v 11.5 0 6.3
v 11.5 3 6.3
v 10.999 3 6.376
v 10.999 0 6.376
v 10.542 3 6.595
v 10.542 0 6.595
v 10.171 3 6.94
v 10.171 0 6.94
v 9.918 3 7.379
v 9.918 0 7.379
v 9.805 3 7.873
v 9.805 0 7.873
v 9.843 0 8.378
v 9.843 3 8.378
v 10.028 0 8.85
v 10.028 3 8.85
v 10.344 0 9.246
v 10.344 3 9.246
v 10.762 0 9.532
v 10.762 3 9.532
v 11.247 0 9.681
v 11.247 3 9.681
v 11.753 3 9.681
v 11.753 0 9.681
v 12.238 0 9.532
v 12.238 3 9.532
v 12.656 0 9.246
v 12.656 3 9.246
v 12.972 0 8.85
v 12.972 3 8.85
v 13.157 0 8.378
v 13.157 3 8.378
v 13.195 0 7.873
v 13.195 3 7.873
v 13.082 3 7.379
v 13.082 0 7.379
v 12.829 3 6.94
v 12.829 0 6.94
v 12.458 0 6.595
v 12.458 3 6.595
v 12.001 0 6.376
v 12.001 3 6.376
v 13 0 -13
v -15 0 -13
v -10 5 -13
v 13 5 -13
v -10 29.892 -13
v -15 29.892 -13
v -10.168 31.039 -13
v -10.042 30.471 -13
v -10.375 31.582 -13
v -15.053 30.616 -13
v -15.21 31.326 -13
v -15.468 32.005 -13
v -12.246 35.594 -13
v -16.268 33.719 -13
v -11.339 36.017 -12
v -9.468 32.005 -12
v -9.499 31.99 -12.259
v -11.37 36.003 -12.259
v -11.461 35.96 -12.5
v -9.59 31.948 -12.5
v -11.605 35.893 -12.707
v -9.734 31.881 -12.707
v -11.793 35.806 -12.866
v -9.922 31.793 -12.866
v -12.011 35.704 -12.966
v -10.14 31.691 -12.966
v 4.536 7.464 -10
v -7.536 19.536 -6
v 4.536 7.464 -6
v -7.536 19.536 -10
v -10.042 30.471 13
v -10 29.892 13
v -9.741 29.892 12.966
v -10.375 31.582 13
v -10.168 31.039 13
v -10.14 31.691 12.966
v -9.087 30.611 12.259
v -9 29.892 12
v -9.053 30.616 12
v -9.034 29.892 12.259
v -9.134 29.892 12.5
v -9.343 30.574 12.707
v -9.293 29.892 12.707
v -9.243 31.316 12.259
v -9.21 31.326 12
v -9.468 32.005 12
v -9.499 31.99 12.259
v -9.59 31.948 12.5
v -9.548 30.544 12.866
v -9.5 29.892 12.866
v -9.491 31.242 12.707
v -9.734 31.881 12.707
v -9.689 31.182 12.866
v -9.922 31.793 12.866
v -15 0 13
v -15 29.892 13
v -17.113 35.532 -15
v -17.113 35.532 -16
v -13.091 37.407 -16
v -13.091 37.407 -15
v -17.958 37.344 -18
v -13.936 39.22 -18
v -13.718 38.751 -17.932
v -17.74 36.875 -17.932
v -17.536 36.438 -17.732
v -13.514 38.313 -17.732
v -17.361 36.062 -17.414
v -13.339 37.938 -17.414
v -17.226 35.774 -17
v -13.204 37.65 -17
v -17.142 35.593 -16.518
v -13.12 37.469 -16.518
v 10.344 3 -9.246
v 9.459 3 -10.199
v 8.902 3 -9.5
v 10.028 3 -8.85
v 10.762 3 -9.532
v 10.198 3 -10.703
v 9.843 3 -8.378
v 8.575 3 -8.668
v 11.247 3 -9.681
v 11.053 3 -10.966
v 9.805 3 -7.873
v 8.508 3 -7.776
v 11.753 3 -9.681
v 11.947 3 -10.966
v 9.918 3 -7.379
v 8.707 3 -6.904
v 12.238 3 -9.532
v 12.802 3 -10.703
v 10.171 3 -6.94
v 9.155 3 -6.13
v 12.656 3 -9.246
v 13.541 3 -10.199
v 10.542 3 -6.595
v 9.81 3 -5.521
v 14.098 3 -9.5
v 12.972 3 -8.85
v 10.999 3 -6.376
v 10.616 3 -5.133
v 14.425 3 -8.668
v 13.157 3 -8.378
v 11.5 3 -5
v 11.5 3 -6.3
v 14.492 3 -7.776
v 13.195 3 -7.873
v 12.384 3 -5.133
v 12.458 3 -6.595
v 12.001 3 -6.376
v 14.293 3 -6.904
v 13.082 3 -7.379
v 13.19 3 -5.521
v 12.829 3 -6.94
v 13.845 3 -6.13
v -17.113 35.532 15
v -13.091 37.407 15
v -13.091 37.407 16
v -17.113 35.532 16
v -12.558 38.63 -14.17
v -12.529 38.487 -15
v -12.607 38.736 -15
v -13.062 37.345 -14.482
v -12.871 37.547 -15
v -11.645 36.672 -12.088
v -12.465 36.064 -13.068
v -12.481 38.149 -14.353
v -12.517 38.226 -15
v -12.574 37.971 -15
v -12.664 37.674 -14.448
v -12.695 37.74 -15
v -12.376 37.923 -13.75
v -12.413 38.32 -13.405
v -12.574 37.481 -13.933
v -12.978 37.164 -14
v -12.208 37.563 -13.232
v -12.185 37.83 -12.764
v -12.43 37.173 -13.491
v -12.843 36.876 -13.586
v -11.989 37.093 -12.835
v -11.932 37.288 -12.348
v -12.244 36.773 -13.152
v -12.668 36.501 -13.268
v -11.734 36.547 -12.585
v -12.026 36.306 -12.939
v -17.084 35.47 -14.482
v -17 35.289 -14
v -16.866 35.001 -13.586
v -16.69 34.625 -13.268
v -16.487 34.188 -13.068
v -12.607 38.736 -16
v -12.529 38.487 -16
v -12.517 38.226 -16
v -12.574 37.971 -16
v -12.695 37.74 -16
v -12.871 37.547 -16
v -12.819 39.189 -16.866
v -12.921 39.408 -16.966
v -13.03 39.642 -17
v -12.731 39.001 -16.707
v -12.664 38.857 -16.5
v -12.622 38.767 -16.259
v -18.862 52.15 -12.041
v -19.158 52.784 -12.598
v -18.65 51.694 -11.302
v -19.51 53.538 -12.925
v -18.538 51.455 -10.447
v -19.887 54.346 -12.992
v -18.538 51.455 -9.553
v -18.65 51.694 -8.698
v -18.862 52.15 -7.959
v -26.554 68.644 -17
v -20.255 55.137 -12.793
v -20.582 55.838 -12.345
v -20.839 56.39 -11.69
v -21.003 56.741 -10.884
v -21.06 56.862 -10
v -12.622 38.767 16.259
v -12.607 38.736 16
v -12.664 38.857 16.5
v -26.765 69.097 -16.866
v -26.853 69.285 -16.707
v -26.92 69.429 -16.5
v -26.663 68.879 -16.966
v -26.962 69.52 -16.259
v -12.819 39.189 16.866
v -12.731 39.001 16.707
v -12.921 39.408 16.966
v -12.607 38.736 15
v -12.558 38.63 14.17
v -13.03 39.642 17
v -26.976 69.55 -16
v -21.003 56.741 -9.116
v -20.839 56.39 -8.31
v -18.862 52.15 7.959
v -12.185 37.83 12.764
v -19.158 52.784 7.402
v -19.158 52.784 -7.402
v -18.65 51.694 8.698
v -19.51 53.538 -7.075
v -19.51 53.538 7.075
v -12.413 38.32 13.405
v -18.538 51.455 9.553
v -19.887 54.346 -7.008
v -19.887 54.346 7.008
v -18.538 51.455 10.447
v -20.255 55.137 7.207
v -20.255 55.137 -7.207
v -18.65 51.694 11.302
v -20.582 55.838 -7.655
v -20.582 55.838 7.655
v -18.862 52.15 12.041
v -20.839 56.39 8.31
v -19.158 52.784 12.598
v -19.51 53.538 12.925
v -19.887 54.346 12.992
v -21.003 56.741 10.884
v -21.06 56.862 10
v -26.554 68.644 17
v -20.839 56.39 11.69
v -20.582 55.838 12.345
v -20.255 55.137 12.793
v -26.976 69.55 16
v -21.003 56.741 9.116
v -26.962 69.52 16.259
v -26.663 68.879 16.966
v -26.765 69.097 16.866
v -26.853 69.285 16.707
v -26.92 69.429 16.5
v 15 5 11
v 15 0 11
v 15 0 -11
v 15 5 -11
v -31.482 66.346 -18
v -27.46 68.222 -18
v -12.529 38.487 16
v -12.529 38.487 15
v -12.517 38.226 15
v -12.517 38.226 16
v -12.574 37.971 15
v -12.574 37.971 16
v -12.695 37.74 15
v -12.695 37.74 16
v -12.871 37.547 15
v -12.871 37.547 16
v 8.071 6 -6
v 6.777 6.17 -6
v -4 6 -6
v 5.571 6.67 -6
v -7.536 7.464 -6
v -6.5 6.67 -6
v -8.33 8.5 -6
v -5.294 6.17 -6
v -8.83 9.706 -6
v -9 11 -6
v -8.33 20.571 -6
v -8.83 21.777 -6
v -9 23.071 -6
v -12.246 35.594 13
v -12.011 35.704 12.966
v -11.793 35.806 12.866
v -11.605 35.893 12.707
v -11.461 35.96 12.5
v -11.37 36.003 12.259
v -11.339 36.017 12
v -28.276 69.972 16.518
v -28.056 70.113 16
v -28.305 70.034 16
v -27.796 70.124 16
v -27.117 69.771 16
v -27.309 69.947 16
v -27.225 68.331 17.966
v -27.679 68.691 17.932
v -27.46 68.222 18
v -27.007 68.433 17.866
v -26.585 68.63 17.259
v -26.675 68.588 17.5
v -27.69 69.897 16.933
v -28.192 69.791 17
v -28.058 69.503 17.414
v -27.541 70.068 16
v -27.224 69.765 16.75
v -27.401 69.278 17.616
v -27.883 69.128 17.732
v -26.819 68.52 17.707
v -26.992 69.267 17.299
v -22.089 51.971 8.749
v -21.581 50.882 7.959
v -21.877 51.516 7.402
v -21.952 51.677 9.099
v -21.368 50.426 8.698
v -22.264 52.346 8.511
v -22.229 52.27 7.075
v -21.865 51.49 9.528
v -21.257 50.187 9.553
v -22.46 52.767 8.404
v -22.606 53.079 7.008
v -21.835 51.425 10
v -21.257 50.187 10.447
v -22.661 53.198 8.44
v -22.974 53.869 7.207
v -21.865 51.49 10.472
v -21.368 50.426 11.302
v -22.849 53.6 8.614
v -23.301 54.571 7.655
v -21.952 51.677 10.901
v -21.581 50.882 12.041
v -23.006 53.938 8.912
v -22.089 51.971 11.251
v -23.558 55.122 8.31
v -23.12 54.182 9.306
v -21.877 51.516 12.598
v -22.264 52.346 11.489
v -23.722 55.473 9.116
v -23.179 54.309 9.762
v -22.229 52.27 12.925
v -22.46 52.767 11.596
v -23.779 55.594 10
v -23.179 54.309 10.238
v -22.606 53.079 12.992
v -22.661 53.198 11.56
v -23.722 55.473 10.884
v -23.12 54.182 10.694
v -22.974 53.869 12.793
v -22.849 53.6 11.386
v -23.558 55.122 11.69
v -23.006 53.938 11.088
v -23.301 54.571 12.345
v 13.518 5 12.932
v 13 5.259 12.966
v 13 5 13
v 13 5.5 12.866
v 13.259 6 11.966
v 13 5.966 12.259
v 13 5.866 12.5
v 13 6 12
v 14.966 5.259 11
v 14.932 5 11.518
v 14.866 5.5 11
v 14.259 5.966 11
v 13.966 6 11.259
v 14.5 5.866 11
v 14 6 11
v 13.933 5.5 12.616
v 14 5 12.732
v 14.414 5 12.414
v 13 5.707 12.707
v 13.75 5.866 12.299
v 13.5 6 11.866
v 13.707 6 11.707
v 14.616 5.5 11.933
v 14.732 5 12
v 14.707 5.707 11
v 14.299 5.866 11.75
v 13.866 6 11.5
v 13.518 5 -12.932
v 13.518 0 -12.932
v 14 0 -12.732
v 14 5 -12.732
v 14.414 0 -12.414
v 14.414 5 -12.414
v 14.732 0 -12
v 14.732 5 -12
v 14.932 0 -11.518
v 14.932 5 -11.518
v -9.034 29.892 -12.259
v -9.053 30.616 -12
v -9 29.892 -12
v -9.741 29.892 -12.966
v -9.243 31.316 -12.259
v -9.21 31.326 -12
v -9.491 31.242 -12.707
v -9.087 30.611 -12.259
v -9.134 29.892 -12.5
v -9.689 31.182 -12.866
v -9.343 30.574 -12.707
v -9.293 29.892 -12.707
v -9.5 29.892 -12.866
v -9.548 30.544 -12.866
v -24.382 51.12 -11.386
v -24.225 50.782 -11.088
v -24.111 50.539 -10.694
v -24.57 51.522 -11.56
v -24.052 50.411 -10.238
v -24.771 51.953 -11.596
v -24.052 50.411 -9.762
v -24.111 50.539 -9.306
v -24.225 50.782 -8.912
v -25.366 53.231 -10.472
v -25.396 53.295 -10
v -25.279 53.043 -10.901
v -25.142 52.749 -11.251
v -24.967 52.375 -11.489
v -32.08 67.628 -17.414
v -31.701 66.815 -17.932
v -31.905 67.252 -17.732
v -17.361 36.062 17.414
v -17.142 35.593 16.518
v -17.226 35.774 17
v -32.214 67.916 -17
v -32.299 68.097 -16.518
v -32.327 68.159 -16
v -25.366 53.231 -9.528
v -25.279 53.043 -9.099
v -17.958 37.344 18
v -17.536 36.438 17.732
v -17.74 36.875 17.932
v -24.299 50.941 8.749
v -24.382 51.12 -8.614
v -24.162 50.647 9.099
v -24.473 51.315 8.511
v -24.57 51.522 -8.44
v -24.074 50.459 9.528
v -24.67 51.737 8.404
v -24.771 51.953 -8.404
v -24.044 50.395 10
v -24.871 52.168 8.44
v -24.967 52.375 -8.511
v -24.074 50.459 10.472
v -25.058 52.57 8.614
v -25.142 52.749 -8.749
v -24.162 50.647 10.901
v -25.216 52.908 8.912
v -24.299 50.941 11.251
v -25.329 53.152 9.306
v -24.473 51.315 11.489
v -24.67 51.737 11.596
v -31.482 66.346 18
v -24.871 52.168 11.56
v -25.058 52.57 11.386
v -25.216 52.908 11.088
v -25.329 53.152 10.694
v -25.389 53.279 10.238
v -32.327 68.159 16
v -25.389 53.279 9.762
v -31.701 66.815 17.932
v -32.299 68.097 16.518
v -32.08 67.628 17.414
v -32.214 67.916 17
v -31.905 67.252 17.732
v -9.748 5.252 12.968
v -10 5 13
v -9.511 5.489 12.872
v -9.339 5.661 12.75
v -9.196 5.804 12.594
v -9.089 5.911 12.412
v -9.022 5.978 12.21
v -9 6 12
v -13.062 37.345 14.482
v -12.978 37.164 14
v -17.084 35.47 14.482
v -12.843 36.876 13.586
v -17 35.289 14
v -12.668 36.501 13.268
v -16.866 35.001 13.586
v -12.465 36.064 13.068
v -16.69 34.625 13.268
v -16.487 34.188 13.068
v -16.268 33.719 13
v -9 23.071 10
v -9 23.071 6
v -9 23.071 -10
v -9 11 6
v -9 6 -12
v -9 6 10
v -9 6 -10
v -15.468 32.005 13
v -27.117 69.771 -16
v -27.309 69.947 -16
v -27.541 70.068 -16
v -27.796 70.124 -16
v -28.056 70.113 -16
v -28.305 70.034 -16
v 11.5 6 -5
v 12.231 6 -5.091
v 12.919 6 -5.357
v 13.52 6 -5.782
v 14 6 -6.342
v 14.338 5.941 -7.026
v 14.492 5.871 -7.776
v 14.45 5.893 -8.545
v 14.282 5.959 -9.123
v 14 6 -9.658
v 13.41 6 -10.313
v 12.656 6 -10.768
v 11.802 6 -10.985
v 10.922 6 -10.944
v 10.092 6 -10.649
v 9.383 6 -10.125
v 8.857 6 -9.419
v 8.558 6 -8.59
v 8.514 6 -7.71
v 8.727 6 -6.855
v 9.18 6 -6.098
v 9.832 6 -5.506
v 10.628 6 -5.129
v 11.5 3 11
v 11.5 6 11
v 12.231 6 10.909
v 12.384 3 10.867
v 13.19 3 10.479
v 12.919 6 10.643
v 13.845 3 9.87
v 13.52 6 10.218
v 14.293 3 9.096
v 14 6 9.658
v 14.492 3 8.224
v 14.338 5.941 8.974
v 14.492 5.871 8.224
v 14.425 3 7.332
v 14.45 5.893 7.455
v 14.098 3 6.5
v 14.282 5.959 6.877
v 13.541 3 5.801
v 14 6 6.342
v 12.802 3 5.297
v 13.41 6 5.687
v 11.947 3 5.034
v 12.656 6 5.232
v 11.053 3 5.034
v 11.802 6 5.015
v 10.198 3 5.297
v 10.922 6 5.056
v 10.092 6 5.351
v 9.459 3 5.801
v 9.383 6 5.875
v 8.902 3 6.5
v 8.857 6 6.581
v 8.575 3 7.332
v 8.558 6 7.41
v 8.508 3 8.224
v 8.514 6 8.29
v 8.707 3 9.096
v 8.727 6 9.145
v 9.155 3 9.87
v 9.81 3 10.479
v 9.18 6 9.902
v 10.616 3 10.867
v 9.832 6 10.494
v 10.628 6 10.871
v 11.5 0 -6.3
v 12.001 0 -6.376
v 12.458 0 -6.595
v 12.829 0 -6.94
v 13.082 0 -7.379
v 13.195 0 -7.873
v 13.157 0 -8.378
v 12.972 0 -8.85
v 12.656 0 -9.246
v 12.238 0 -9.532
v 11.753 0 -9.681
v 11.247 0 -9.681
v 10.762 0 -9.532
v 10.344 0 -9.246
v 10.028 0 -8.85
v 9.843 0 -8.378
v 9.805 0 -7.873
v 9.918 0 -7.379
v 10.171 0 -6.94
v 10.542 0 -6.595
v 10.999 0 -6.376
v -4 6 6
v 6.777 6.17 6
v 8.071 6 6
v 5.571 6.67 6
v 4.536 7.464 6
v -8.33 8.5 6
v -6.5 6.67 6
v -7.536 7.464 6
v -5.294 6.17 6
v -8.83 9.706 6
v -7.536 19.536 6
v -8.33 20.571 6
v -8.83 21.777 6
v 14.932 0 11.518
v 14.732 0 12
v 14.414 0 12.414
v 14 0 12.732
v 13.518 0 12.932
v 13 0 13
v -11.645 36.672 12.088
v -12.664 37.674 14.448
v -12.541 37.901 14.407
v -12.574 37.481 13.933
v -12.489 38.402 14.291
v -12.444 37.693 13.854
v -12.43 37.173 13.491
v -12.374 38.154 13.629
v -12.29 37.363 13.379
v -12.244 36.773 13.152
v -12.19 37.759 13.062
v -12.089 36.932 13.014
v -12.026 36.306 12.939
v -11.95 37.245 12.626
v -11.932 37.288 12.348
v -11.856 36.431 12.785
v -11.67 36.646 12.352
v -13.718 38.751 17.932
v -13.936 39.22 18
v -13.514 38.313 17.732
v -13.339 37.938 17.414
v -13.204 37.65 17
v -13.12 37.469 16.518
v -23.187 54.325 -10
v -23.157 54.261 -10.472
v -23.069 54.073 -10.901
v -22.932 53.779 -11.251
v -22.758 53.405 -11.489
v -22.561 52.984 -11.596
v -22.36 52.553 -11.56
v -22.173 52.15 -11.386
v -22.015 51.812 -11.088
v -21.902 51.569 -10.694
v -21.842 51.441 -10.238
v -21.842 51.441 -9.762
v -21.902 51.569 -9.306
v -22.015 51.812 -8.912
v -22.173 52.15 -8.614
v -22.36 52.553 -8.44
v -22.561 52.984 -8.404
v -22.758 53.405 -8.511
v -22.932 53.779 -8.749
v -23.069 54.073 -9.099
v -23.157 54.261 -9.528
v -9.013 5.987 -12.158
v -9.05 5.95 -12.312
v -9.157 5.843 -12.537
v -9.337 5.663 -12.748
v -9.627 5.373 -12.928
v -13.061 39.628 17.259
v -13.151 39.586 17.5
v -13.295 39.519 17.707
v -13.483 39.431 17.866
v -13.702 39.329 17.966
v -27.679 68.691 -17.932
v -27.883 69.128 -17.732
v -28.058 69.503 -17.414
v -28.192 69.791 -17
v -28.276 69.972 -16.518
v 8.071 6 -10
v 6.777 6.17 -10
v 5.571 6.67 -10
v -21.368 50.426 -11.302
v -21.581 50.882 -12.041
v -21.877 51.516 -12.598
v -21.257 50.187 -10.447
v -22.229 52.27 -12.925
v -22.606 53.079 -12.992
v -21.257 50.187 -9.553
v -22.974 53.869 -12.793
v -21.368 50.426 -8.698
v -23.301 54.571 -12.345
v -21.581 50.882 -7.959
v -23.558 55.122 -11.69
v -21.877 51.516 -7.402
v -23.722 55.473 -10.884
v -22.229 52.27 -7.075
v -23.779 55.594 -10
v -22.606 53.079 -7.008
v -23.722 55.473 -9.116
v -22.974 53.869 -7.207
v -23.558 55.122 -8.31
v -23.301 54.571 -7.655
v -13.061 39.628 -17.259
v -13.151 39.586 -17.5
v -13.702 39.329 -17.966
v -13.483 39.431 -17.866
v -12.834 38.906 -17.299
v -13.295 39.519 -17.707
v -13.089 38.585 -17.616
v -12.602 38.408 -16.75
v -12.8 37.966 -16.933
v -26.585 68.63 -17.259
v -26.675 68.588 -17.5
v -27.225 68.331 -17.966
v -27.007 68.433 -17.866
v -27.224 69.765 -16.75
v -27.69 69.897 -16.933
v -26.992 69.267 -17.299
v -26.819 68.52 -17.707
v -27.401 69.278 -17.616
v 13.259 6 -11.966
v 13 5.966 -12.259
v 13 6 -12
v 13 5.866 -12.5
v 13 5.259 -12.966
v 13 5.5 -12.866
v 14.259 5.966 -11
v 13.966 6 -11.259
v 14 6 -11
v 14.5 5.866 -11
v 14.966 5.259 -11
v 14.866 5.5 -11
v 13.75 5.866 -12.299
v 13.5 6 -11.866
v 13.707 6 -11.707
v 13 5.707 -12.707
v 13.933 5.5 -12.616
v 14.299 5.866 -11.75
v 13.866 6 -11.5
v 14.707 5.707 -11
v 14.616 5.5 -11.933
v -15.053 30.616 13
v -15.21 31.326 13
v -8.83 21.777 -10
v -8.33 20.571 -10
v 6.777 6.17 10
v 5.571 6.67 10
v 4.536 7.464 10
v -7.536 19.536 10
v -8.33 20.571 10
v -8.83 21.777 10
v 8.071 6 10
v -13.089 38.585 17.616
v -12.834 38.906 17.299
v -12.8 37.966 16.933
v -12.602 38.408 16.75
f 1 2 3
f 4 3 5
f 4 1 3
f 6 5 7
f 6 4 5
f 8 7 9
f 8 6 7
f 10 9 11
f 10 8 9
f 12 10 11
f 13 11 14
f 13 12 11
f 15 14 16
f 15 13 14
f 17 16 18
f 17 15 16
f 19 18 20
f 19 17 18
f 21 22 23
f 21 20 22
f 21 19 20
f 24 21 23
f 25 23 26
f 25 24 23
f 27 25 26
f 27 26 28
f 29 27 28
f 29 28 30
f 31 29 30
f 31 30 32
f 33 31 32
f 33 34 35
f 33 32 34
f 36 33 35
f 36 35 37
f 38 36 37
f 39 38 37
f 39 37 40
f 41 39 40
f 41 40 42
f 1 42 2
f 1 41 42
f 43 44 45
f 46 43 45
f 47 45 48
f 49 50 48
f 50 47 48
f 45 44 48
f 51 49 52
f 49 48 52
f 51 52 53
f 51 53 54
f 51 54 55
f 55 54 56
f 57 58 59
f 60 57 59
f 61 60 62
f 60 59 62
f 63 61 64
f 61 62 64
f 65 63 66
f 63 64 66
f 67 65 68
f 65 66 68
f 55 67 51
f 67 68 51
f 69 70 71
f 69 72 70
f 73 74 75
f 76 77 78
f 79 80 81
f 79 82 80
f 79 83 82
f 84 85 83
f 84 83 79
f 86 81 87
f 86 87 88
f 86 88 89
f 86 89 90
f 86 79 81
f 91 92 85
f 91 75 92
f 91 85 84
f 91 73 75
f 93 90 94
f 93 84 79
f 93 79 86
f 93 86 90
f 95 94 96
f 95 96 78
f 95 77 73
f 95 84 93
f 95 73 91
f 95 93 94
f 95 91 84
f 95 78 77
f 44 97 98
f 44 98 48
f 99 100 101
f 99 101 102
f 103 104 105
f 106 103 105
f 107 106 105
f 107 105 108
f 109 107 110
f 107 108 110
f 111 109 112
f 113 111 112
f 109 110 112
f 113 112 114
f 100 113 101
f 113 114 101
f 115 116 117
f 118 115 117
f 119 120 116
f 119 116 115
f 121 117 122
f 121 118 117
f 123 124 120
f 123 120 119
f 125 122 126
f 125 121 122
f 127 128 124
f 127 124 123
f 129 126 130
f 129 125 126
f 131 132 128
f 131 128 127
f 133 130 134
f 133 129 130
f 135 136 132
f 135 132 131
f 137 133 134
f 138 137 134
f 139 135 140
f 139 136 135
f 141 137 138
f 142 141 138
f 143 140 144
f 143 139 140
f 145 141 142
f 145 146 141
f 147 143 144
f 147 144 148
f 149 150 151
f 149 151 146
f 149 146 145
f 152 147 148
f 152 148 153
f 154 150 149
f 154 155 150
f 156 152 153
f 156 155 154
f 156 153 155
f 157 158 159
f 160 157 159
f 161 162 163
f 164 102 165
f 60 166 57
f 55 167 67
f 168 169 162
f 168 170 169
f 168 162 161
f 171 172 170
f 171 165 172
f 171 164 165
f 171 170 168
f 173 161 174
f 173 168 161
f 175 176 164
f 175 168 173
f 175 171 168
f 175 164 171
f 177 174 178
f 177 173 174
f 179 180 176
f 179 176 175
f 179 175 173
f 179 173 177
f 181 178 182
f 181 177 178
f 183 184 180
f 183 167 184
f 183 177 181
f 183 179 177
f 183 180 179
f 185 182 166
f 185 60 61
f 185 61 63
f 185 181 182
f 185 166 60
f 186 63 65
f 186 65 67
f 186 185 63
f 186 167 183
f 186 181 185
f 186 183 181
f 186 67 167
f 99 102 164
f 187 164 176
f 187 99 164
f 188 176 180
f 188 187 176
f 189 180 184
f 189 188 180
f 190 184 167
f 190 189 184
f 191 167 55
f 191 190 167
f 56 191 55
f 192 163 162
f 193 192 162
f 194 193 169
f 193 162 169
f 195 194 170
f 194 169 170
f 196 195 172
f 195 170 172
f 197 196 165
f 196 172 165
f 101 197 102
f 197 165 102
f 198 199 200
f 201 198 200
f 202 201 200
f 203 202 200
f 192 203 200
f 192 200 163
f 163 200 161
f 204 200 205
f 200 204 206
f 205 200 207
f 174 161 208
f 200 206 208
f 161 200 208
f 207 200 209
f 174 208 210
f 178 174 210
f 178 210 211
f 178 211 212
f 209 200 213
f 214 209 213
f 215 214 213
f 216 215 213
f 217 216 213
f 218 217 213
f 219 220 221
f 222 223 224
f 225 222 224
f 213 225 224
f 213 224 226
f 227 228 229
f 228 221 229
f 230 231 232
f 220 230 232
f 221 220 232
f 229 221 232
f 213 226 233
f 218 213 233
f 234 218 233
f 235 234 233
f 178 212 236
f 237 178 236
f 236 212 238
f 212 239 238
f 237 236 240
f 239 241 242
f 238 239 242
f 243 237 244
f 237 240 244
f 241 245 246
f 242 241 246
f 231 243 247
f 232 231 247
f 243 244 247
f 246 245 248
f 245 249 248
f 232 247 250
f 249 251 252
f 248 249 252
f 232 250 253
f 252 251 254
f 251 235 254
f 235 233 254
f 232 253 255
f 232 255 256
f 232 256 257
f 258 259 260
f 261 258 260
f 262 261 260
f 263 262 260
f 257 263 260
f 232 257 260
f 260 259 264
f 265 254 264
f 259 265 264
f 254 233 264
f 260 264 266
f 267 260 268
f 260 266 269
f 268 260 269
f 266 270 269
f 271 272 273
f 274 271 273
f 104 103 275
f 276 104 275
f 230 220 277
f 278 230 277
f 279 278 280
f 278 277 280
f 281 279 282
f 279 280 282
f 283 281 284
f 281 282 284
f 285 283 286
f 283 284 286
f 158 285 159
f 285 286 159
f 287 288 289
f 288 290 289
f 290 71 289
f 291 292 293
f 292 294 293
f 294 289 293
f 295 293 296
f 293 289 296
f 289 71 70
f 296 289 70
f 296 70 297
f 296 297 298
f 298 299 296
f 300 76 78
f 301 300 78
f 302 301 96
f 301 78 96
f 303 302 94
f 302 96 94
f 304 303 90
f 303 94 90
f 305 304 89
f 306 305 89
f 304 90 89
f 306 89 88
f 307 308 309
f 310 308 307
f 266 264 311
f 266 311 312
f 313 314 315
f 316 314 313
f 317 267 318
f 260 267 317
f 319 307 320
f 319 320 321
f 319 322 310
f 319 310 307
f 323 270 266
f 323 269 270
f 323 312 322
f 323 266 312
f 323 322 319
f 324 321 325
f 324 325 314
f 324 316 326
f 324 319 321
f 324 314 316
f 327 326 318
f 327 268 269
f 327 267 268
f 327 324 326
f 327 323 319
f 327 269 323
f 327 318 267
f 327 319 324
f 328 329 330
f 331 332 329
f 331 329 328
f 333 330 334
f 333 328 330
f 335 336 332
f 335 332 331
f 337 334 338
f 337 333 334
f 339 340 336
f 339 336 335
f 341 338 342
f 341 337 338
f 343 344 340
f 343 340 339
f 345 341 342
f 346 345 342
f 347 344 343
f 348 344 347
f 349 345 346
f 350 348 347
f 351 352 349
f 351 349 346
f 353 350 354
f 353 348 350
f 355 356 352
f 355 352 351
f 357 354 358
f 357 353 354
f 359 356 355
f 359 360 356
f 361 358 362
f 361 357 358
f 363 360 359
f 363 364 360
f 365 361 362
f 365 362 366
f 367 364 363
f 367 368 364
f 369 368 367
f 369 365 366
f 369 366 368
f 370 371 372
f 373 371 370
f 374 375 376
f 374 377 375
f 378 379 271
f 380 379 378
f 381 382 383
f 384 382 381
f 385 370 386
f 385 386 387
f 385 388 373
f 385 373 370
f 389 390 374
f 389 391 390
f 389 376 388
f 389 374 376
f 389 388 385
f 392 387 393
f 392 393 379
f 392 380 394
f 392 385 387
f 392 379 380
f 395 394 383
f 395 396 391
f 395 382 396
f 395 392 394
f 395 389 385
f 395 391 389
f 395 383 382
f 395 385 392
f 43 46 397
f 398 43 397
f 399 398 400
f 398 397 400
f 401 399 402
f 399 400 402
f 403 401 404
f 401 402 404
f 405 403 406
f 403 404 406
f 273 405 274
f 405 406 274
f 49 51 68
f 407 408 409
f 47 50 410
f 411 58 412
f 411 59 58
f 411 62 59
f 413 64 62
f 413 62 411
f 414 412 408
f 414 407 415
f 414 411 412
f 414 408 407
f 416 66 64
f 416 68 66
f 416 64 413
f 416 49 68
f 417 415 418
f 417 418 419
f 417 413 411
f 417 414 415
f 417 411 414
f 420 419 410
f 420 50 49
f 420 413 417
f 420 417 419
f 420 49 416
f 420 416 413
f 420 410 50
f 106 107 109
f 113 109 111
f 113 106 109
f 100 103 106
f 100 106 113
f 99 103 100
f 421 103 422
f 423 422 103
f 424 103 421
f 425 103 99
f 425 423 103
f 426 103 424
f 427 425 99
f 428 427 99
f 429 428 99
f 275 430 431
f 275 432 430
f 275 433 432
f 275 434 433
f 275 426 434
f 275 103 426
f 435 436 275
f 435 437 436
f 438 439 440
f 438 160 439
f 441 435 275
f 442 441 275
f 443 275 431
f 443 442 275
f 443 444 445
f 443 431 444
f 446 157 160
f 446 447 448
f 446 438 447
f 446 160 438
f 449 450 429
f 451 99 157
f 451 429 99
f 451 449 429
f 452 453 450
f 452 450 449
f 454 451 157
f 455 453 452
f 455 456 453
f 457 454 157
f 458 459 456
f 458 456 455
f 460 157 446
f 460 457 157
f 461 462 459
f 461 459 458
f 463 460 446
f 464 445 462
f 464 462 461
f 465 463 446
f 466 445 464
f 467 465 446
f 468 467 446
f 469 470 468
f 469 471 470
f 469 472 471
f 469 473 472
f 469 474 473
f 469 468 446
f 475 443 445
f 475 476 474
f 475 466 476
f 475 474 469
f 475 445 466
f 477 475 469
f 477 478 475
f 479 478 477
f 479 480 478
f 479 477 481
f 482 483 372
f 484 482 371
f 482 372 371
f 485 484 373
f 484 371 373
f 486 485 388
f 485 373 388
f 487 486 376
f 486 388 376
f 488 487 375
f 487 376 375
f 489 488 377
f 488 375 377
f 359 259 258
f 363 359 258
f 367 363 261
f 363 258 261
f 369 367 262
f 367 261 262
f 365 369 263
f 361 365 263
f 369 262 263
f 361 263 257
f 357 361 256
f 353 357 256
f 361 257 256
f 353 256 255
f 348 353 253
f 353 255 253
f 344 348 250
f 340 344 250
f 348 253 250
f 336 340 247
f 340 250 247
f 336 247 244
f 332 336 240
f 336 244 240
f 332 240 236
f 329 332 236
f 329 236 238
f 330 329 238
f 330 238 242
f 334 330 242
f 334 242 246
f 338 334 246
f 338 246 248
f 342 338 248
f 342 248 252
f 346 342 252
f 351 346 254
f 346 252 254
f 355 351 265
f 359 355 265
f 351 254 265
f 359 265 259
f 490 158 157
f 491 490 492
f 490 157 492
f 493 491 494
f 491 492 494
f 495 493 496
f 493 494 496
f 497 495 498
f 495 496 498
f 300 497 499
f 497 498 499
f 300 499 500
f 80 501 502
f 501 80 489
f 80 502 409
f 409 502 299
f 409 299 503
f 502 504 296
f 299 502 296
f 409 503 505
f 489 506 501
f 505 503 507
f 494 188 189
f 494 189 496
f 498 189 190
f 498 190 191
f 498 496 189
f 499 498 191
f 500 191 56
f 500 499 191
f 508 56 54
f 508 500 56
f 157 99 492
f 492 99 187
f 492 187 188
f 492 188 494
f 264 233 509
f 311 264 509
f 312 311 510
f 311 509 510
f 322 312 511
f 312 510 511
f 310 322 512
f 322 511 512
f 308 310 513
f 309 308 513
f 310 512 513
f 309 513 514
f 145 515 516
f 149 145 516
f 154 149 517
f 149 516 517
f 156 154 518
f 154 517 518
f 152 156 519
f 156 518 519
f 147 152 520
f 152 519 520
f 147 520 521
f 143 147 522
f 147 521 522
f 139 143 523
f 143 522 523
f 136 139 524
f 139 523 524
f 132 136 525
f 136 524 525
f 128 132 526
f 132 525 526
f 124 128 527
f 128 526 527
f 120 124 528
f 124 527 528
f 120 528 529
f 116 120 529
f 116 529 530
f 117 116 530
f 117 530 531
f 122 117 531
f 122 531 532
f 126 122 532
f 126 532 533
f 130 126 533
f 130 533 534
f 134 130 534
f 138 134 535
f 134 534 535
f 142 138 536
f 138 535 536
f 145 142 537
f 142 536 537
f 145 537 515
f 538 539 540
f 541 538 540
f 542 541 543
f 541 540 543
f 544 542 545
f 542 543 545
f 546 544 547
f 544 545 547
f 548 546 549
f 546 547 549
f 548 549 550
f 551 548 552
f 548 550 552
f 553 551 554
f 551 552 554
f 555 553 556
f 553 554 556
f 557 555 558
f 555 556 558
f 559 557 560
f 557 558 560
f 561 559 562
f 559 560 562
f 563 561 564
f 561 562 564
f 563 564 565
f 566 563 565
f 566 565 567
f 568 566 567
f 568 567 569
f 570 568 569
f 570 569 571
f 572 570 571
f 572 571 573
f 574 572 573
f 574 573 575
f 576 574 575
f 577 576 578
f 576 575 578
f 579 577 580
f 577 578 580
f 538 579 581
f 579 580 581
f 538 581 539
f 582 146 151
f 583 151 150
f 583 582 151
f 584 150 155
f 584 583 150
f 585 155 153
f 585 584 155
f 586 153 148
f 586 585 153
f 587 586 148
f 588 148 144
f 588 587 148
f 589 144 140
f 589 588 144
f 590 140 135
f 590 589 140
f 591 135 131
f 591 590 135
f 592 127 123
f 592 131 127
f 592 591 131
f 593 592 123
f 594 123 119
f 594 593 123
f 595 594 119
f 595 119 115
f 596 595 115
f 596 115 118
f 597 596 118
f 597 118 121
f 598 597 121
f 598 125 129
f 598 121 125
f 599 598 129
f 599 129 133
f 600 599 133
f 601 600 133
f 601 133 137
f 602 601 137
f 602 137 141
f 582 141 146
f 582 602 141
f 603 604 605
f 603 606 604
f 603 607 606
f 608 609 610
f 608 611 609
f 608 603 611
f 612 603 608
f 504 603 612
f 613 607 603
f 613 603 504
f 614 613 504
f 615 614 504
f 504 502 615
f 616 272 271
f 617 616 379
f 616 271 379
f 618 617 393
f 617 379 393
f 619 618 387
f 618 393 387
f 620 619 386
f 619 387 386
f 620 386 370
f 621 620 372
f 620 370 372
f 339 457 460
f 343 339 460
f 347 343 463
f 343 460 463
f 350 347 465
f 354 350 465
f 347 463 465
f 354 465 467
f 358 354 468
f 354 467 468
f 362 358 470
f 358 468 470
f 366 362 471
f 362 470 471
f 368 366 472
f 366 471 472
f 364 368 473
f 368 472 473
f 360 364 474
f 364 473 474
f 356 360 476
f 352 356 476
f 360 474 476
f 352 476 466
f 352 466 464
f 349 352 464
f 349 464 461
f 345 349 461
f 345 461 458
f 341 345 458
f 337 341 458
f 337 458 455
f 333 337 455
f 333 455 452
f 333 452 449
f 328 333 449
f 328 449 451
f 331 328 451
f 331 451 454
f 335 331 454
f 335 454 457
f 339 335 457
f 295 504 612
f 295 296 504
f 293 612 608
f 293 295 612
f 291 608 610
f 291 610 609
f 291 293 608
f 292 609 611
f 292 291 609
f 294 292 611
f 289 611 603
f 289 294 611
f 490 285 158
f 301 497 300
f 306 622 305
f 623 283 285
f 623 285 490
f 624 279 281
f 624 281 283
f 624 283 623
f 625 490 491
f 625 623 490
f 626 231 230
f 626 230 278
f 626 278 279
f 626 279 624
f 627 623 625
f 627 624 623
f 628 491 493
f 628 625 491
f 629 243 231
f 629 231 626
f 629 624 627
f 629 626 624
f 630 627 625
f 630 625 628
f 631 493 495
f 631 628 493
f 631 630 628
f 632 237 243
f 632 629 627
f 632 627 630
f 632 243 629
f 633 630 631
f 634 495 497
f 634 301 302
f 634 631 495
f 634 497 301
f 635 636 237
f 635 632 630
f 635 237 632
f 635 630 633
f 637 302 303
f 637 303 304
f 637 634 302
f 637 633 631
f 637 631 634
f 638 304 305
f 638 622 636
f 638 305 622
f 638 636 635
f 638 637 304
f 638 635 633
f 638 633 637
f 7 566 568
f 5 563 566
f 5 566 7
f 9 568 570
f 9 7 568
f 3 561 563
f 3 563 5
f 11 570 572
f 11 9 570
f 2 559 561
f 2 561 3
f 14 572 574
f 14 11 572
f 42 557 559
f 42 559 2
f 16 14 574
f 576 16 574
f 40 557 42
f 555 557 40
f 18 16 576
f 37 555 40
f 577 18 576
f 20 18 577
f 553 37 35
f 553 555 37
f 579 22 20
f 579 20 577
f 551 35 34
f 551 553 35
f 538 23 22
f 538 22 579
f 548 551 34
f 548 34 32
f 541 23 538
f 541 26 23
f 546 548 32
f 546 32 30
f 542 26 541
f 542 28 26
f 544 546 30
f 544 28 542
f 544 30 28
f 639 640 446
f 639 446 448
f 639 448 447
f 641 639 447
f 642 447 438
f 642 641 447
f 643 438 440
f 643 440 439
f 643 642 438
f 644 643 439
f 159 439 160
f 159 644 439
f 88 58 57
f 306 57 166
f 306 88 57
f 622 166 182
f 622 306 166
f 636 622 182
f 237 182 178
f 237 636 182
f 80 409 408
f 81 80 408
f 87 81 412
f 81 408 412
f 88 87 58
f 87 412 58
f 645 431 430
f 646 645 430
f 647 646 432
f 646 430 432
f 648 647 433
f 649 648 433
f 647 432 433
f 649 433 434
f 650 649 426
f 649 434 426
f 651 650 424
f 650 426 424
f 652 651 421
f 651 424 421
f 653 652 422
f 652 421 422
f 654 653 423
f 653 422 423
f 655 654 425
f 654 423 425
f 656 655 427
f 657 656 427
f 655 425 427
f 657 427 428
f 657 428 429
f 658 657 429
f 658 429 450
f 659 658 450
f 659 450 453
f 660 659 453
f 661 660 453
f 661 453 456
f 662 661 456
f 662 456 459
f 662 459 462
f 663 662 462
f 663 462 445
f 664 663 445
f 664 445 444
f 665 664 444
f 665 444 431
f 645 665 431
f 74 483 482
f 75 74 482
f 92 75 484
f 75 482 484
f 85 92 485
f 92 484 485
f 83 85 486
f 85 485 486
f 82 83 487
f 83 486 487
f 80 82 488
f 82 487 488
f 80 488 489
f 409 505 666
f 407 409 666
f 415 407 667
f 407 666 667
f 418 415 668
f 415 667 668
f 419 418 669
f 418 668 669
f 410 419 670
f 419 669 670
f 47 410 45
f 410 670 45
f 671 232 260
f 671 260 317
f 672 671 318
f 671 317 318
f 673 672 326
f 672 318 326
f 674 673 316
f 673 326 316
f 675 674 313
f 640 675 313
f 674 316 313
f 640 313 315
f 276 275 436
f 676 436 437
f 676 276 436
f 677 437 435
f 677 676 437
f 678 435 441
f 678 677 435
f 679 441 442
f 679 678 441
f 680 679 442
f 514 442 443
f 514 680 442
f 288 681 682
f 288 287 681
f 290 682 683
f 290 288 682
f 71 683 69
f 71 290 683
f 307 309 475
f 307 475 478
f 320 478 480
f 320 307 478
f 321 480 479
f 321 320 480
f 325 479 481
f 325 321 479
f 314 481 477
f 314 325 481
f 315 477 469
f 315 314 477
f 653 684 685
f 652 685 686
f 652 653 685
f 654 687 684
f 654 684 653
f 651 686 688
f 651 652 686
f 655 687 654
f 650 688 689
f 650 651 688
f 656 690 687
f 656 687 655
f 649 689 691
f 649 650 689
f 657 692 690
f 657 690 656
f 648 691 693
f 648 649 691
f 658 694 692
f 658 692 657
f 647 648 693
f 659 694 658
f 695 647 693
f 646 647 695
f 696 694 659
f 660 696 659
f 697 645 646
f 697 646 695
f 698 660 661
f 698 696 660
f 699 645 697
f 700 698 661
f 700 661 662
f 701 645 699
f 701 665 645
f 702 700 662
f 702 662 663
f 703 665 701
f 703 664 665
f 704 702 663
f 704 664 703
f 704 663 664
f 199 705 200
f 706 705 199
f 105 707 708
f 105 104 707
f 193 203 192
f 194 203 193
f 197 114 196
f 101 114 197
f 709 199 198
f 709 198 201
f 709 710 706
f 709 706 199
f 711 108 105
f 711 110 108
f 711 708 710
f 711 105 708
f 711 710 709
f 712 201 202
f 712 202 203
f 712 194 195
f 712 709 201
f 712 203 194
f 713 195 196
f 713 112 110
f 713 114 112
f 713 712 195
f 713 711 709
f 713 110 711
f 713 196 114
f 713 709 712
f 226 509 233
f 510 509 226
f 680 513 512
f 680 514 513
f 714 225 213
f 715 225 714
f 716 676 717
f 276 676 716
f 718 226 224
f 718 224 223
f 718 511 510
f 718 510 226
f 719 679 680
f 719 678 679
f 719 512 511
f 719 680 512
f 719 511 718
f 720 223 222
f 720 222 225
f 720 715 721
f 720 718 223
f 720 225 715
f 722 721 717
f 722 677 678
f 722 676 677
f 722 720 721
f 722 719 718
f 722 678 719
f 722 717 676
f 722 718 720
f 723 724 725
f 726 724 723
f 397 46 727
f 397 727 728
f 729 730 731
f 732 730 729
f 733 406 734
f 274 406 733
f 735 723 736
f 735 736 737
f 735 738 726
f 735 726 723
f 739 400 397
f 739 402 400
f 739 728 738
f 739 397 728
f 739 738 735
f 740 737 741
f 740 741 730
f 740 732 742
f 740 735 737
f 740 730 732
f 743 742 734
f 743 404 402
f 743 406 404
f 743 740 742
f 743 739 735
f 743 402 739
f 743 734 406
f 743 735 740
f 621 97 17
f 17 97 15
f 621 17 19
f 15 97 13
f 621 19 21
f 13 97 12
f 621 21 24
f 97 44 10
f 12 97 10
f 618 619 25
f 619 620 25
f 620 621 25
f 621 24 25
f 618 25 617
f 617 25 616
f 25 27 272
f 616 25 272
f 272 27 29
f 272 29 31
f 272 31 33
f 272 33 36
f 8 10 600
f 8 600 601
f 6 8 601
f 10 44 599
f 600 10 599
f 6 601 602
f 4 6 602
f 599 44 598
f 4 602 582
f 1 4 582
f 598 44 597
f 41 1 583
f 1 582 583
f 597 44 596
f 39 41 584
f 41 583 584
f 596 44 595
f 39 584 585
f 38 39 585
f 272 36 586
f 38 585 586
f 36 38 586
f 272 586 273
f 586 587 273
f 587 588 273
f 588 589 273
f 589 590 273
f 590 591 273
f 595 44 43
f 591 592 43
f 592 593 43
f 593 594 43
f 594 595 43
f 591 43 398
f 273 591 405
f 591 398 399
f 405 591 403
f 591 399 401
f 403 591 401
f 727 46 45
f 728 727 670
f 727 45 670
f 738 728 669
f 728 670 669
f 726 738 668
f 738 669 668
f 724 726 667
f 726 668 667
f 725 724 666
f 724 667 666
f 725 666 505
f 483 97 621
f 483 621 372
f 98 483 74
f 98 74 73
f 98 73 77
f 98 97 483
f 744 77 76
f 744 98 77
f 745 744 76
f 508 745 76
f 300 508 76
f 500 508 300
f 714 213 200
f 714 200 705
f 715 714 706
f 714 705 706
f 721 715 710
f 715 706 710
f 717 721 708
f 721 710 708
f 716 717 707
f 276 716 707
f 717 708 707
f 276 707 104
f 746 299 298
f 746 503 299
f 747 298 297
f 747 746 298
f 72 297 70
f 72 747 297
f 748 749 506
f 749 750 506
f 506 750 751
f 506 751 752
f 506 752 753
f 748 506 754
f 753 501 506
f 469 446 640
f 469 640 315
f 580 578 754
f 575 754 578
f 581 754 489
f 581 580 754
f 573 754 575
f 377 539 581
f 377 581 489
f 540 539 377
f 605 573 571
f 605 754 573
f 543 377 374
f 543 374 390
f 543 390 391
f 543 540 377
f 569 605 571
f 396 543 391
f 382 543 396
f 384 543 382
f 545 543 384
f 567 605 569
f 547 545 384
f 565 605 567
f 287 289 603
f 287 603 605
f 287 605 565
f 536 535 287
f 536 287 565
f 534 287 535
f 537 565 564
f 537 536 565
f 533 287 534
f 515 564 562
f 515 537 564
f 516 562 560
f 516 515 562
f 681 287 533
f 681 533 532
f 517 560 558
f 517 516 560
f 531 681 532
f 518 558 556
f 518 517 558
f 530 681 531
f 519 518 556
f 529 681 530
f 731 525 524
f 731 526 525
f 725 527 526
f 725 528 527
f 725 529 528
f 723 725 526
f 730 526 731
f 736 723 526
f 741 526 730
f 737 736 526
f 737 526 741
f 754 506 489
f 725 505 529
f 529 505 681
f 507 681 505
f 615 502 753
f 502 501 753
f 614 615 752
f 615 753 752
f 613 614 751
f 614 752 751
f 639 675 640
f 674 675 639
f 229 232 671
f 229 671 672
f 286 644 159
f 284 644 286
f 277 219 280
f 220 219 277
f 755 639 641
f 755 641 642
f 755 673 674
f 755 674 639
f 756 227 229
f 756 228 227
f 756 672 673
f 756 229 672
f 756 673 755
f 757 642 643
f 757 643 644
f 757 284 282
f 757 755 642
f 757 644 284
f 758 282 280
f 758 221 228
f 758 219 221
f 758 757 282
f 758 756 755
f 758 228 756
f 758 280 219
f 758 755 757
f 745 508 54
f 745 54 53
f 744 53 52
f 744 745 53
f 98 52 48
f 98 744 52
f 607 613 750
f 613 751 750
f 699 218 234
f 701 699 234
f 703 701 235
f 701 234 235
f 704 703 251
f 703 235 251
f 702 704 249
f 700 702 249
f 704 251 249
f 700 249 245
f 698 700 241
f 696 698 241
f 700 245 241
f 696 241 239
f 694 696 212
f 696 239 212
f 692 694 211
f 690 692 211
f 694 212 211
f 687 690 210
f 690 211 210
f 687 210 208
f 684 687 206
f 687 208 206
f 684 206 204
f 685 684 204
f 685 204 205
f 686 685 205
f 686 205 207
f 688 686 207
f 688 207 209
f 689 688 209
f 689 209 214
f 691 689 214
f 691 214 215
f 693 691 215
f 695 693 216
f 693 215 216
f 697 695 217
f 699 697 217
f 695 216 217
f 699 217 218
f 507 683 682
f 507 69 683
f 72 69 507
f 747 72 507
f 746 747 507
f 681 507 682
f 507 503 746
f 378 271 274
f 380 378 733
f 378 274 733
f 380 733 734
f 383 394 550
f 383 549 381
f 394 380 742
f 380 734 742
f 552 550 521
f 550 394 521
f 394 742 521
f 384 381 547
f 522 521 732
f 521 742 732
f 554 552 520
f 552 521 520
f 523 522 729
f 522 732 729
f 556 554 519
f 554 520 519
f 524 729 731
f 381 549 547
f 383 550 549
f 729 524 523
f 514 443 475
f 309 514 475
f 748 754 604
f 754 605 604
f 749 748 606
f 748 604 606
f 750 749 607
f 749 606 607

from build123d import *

# Parameters (mm, degrees)
SKETCH_1_W          = 30
SKETCH_1_H          = 26
SKETCH_1_R          = 1.7
EXTRUDE_1_DEPTH     = 6
SKETCH_15_W         = 6
SKETCH_15_H         = 26
EXTRUDE_4_DEPTH     = 25
EXTRUDE_5_DEPTH     = 26
SKETCH_17_W         = 36
SKETCH_17_H         = 36
SKETCH_17_R         = 1.6
EXTRUDE_6_DEPTH     = 5.437846722
FILLET_3_R          = 2
SKETCH_18_R         = 3
CUT_EXTRUDE_4_DEPTH = 3
SKETCH_19_R         = 3
CUT_EXTRUDE_5_DEPTH = 3
FILLET_4_R          = 1
FILLET_6_R          = 5
EXTRUDE_7_DEPTH     = 2
FILLET_7_R          = 5
FILLET_8_R          = 5


with BuildPart() as part:
    # 草图1 → 凸台-拉伸1 (new body)
    with BuildSketch(Plane(origin=(0, 0, 0), x_dir=(1, 0, 0), z_dir=(0, 1, 0))):
        Rectangle(SKETCH_1_W, SKETCH_1_H)
        with Locations(Location((11.5, 8, 0), (0, 0, 270))):
            Circle(SKETCH_1_R, mode=Mode.SUBTRACT)
        with Locations(Location((11.5, -8, 0), (0, 0, 90))):
            Circle(SKETCH_1_R, mode=Mode.SUBTRACT)
    extrude(amount=EXTRUDE_1_DEPTH)

    # 草图15 → 凸台-拉伸4 (add)
    with BuildSketch(Plane(origin=(0, 6, 0), x_dir=(1, 0, 0), z_dir=(0, 1, 0))):
        with Locations((-12, 0)):
            Rectangle(SKETCH_15_W, SKETCH_15_H)
    extrude(amount=EXTRUDE_4_DEPTH)

    # 草图16 → 凸台-拉伸5 (add)
    with BuildSketch(Plane.XY.offset(13)):
        Polygon((-9, 31), (-12.18472848, 37.829672265), (-17.113091309, 35.531538935), (-15, 31), align=None)
    extrude(amount=-EXTRUDE_5_DEPTH)

    # 草图17 → 凸台-拉伸6 (add)
    with BuildSketch(Plane(origin=(-0.447218204, -0.208541274, 0), x_dir=(0, 0, 1), z_dir=(-0.906307787036653, -0.4226182617406928, 0))):
        with Locations((0, 57.434815324)):
            Rectangle(SKETCH_17_W, SKETCH_17_H)
        with Locations(Location((10, 57.434815324, 0), (0, 0, 270))):
            Circle(SKETCH_17_R, mode=Mode.SUBTRACT)
        with Locations(Location((-10, 57.434815324, 0), (0, 0, 90))):
            Circle(SKETCH_17_R, mode=Mode.SUBTRACT)
    extrude(amount=-EXTRUDE_6_DEPTH)

    # 圆角3
    fillet_3_edges = [part.edges().sort_by_distance(p)[0] for p in [
        (-14.648909894, 36.6806056, 13),
        (-14.648909894, 36.6806056, -13),
        (-14.648909894, 36.6806056, 18),
        (-29.863167317, 69.307685933, 18),
        (-14.648909894, 36.6806056, -18),
        (-29.863167317, 69.307685933, -18),
        (15, 3, 13),
        (15, 3, -13),
    ]]
    fillet(fillet_3_edges, radius=FILLET_3_R)

    # 草图18 → 切除-拉伸4 (cut)
    with BuildSketch(Plane(origin=(4.481144625, 2.089592056, 0), x_dir=(0, 0, -1), z_dir=(0.9063077870366527, 0.42261826174069367, 0))):
        with Locations(Location((-10, 57.434815324, 0), (0, 0, 90))):
            Circle(SKETCH_18_R)
        with Locations(Location((10, 57.434815324, 0), (0, 0, 90))):
            Circle(SKETCH_18_R)
    extrude(amount=-CUT_EXTRUDE_4_DEPTH, mode=Mode.SUBTRACT)

    # 草图19 → 切除-拉伸5 (cut)
    with BuildSketch(Plane(origin=(0, 6, 0), x_dir=(1, 0, 0), z_dir=(0, 1, 0))):
        with Locations(Location((11.5, 8, 0), (0, 0, 270))):
            Circle(SKETCH_19_R)
        with Locations(Location((11.5, -8, 0), (0, 0, 270))):
            Circle(SKETCH_19_R)
    extrude(amount=-CUT_EXTRUDE_5_DEPTH, mode=Mode.SUBTRACT)

    # 圆角4
    # the kernel refuses this fillet: 1 mm, written as the material it takes off along each edge
    with BuildSketch(Plane(origin=(13, 6, 13), x_dir=(0, -1, 0), z_dir=(-1, 0, 0)), Plane(origin=(-9, 6, -13), x_dir=(0, -1, 0), z_dir=(1, 0, 0))) as fillet_4_piece_1:
        with BuildLine():
            CenterArc((FILLET_4_R, -FILLET_4_R), FILLET_4_R, 90, 90)
            Line((0, -FILLET_4_R), (0, 0))
            Line((0, 0), (FILLET_4_R, 0))
        make_face()
    extrude(amount=22, mode=Mode.SUBTRACT)
    with BuildSketch(Plane(origin=(-9, 6, 13), x_dir=(-1, 0, 0), z_dir=(0, 1, 0))) as fillet_4_piece_2:
        with BuildLine():
            CenterArc((FILLET_4_R, -FILLET_4_R), FILLET_4_R, 90, 90)
            Line((0, -FILLET_4_R), (0, 0))
            Line((0, 0), (FILLET_4_R, 0))
        make_face()
    extrude(amount=27.5, mode=Mode.SUBTRACT)
    with BuildSketch(Plane(origin=(-9, 6, -13), x_dir=(-1, 0, 0), z_dir=(0, 1, 0))) as fillet_4_piece_3:
        with BuildLine():
            CenterArc((FILLET_4_R, FILLET_4_R), FILLET_4_R, 180, 90)
            Line((0, FILLET_4_R), (0, 0))
            Line((0, 0), (FILLET_4_R, 0))
        make_face()
    extrude(amount=27.5, mode=Mode.SUBTRACT)
    with BuildSketch(Plane(origin=(-7.943454346, 28.734230532, 13), x_dir=(0, 0, -1), z_dir=(-0.4226182617406934, 0.9063077870366528, 0))) as fillet_4_piece_4:
        with BuildLine():
            CenterArc((FILLET_4_R, FILLET_4_R), FILLET_4_R, 180, 90)
            Line((0, FILLET_4_R), (0, 0))
            Line((0, 0), (FILLET_4_R, 0))
        make_face()
    extrude(amount=8.035709571, mode=Mode.SUBTRACT)
    with BuildSketch(Plane(origin=(-7.943454346, 28.734230532, -13), x_dir=(0, 0, 1), z_dir=(-0.4226182617406934, 0.9063077870366528, 0))) as fillet_4_piece_5:
        with BuildLine():
            CenterArc((FILLET_4_R, -FILLET_4_R), FILLET_4_R, 90, 90)
            Line((0, -FILLET_4_R), (0, 0))
            Line((0, 0), (FILLET_4_R, 0))
        make_face()
    extrude(amount=8.035709571, mode=Mode.SUBTRACT)
    with BuildSketch(Plane(origin=(15, 6, -11), x_dir=(-1, 0, 0), z_dir=(0, 0, 1))) as fillet_4_piece_6:
        with BuildLine():
            CenterArc((FILLET_4_R, FILLET_4_R), FILLET_4_R, 180, 90)
            Line((0, FILLET_4_R), (0, 0))
            Line((0, 0), (FILLET_4_R, 0))
        make_face()
    extrude(amount=22, mode=Mode.SUBTRACT)
    with BuildSketch(Plane(origin=(13, 6, 11), x_dir=(0, 0, 1), z_dir=(-1, 0, 0))) as fillet_4_piece_7:
        with BuildLine():
            CenterArc((2 - FILLET_4_R, -FILLET_4_R), FILLET_4_R, 0, 90)
            Line((2, -FILLET_4_R), (2, 0))
            Line((2, 0), (2 - FILLET_4_R, 0))
        make_face()
    revolve(axis=Axis((13, 6, 11), (0, 1, 0)), revolution_arc=90, mode=Mode.SUBTRACT)
    with BuildSketch(Plane(origin=(13, 6, -11), x_dir=(0, 0, -1), z_dir=(-1, 0, 0))) as fillet_4_piece_8:
        with BuildLine():
            CenterArc((2 - FILLET_4_R, FILLET_4_R), FILLET_4_R, 270, 90)
            Line((2 - FILLET_4_R, 0), (2, 0))
            Line((2, 0), (2, FILLET_4_R))
        make_face()
    revolve(axis=Axis((13, 6, -11), (0, -1, 0)), revolution_arc=90, mode=Mode.SUBTRACT)
    with BuildSketch(Plane(origin=(-12.18472848, 37.829672264, -15), x_dir=(-0.42261826174069467, 0.9063077870366523, 0), z_dir=(0, 0, -1)), Plane(origin=(-12.18472848, 37.829672264, 16), x_dir=(-0.42261826174069467, 0.9063077870366523, 0), z_dir=(0, 0, -1))) as fillet_4_piece_9:
        with BuildLine():
            CenterArc((FILLET_4_R, -FILLET_4_R), FILLET_4_R, 90, 90)
            Line((0, -FILLET_4_R), (0, 0))
            Line((0, 0), (FILLET_4_R, 0))
        make_face()
    extrude(amount=1, mode=Mode.SUBTRACT)
    with BuildSketch(Plane(origin=(-26.553749379, 68.644137024, 18), x_dir=(0, 0, -1), z_dir=(0.4226182617406928, -0.906307787036653, 0)), Plane(origin=(-13.029965003, 39.642287839, -18), x_dir=(0, 0, 1), z_dir=(-0.4226182617406928, 0.906307787036653, 0))) as fillet_4_piece_10:
        with BuildLine():
            CenterArc((FILLET_4_R, -FILLET_4_R), FILLET_4_R, 90, 90)
            Line((0, -FILLET_4_R), (0, 0))
            Line((0, 0), (FILLET_4_R, 0))
        make_face()
    extrude(amount=32, mode=Mode.SUBTRACT)
    with BuildSketch(Plane(origin=(-27.398985903, 70.456752598, -16), x_dir=(-0.9063077870366528, -0.4226182617406932, 0), z_dir=(0, 0, 1))) as fillet_4_piece_11:
        with BuildLine():
            CenterArc((FILLET_4_R, FILLET_4_R), FILLET_4_R, 180, 90)
            Line((0, FILLET_4_R), (0, 0))
            Line((0, 0), (FILLET_4_R, 0))
        make_face()
    extrude(amount=32, mode=Mode.SUBTRACT)
    with BuildSketch(Plane(origin=(-26.553749379, 68.644137024, -16), x_dir=(-0.42261826174069317, 0.9063077870366529, 0), z_dir=(0, 0, 1))) as fillet_4_piece_12:
        with BuildLine():
            CenterArc((2 - FILLET_4_R, FILLET_4_R), FILLET_4_R, 270, 90)
            Line((2 - FILLET_4_R, 0), (2, 0))
            Line((2, 0), (2, FILLET_4_R))
        make_face()
    revolve(axis=Axis((-26.553749379, 68.644137024, -16), (-0.906307787036653, -0.4226182617406928, 0)), revolution_arc=90, mode=Mode.SUBTRACT)
    with BuildSketch(Plane(origin=(-13.029965003, 39.642287839, -16), x_dir=(0, 0, -1), z_dir=(-0.4226182617406928, 0.906307787036653, 0))) as fillet_4_piece_13:
        with BuildLine():
            CenterArc((2 - FILLET_4_R, FILLET_4_R), FILLET_4_R, 270, 90)
            Line((2, FILLET_4_R), (2, 0))
            Line((2, 0), (2 - FILLET_4_R, 0))
        make_face()
    revolve(axis=Axis((-13.029965003, 39.642287839, -16), (-0.906307787036653, -0.4226182617406928, 0)), revolution_arc=90, mode=Mode.SUBTRACT)
    with BuildSketch(Plane(origin=(-13.029965003, 39.642287839, 16), x_dir=(0, 0, 1), z_dir=(-0.4226182617406928, 0.906307787036653, 0))) as fillet_4_piece_14:
        with BuildLine():
            CenterArc((2 - FILLET_4_R, -FILLET_4_R), FILLET_4_R, 360, 90)
            Line((2, -FILLET_4_R), (2, 0))
            Line((2, 0), (2 - FILLET_4_R, 0))
        make_face()
    revolve(axis=Axis((-13.029965003, 39.642287839, 16), (0.906307787036653, 0.4226182617406928, 0)), revolution_arc=90, mode=Mode.SUBTRACT)
    with BuildSketch(Plane(origin=(-26.553749379, 68.644137024, 16), x_dir=(-0.42261826174069317, 0.9063077870366529, 0), z_dir=(0, 0, -1))) as fillet_4_piece_15:
        with BuildLine():
            CenterArc((2 - FILLET_4_R, -FILLET_4_R), FILLET_4_R, 0, 90)
            Line((2 - FILLET_4_R, 0), (2, 0))
            Line((2, 0), (2, -FILLET_4_R))
        make_face()
    revolve(axis=Axis((-26.553749379, 68.644137024, 16), (0.906307787036653, 0.4226182617406928, 0)), revolution_arc=90, mode=Mode.SUBTRACT)
    with BuildSketch(Plane(origin=(-11.339491956, 36.01705669, -15), x_dir=(-0.42261826174069395, 0.9063077870366527, 0), z_dir=(0, 0, -1))) as fillet_4_piece_16:
        with BuildLine():
            CenterArc((2 + FILLET_4_R, -FILLET_4_R), FILLET_4_R, 90, 90)
            Line((2, -FILLET_4_R), (2, 0))
            Line((2, 0), (2 + FILLET_4_R, 0))
        make_face()
    revolve(axis=Axis((-11.339491956, 36.01705669, -15), (0.9063077870366527, 0.42261826174069356, 0)), revolution_arc=90, mode=Mode.SUBTRACT)
    with BuildSketch(Plane(origin=(-11.339491956, 36.01705669, 15), x_dir=(-0.42261826174069395, 0.9063077870366527, 0), z_dir=(0, 0, 1))) as fillet_4_piece_17:
        with BuildLine():
            CenterArc((2 + FILLET_4_R, FILLET_4_R), FILLET_4_R, 180, 90)
            Line((2, FILLET_4_R), (2, 0))
            Line((2, 0), (2 + FILLET_4_R, 0))
        make_face()
    revolve(axis=Axis((-11.339491956, 36.01705669, 15), (-0.9063077870366527, -0.42261826174069356, 0)), revolution_arc=90, mode=Mode.SUBTRACT)
    with BuildSketch(Plane(origin=(13, 6, 13), x_dir=(0, -1, 0), z_dir=(-1, 0, 0))) as fillet_4_piece_18a_section:
        with BuildLine():
            CenterArc((FILLET_4_R, -FILLET_4_R), FILLET_4_R, 90, 90)
            Line((0, -FILLET_4_R), (0, 0))
            Line((0, 0), (FILLET_4_R, 0))
        make_face()
    fillet_4_piece_18a = extrude(amount=24.5, mode=Mode.PRIVATE)
    fillet_4_piece_18a = split(fillet_4_piece_18a, bisect_by=Plane(origin=(-9, 5.773604886, 12.773604886), z_dir=(-1, 0, 0)), keep=Keep.TOP, mode=Mode.PRIVATE)
    with BuildSketch(Plane(origin=(-9, 3.5, 13), x_dir=(-1, 0, 0), z_dir=(0, 1, 0))) as fillet_4_piece_18b_section:
        with BuildLine():
            CenterArc((FILLET_4_R, -FILLET_4_R), FILLET_4_R, 90, 90)
            Line((0, -FILLET_4_R), (0, 0))
            Line((0, 0), (FILLET_4_R, 0))
        make_face()
    fillet_4_piece_18b = extrude(amount=30, mode=Mode.PRIVATE)
    fillet_4_piece_18b = split(fillet_4_piece_18b, bisect_by=Plane(origin=(-9.226395114, 6, 12.773604886), z_dir=(0, -1, 0)), keep=Keep.TOP, mode=Mode.PRIVATE)
    fillet_4_piece_18 = fillet_4_piece_18a & fillet_4_piece_18b
    add(fillet_4_piece_18, mode=Mode.SUBTRACT)
    with BuildSketch(Plane(origin=(-9, 3.5, -13), x_dir=(-1, 0, 0), z_dir=(0, 1, 0))) as fillet_4_piece_19a_section:
        with BuildLine():
            CenterArc((FILLET_4_R, FILLET_4_R), FILLET_4_R, 180, 90)
            Line((0, FILLET_4_R), (0, 0))
            Line((0, 0), (FILLET_4_R, 0))
        make_face()
    fillet_4_piece_19a = extrude(amount=30, mode=Mode.PRIVATE)
    fillet_4_piece_19a = split(fillet_4_piece_19a, bisect_by=Plane(origin=(-9.226395114, 6, -12.773604886), z_dir=(0, -1, 0)), keep=Keep.TOP, mode=Mode.PRIVATE)
    with BuildSketch(Plane(origin=(-11.5, 6, -13), x_dir=(0, -1, 0), z_dir=(1, 0, 0))) as fillet_4_piece_19b_section:
        with BuildLine():
            CenterArc((FILLET_4_R, -FILLET_4_R), FILLET_4_R, 90, 90)
            Line((0, -FILLET_4_R), (0, 0))
            Line((0, 0), (FILLET_4_R, 0))
        make_face()
    fillet_4_piece_19b = extrude(amount=24.5, mode=Mode.PRIVATE)
    fillet_4_piece_19b = split(fillet_4_piece_19b, bisect_by=Plane(origin=(-9, 5.773604886, -12.773604886), z_dir=(-1, 0, 0)), keep=Keep.TOP, mode=Mode.PRIVATE)
    fillet_4_piece_19 = fillet_4_piece_19a & fillet_4_piece_19b
    add(fillet_4_piece_19, mode=Mode.SUBTRACT)

    # 圆角6
    # the kernel refuses this fillet: 5 mm, written as the material it adds along each edge
    with BuildSketch(Plane(origin=(-15, 31, 13), x_dir=(0, -1, 0), z_dir=(0, 0, -1))) as fillet_6_piece_1:
        with BuildLine():
            CenterArc((FILLET_6_R * 0.221694662643, FILLET_6_R), FILLET_6_R, 245, 25)
            Line((-FILLET_6_R * 0.200923599098, FILLET_6_R * 0.0936922129633), (0, 0))
            Line((0, 0), (FILLET_6_R * 0.221694662643, 0))
        make_face()
    extrude(amount=26)
    # the kernel refuses this fillet: 5 mm, written as the material it takes off along each edge
    with BuildSketch(Plane(origin=(-14, 29.891526686, 13), x_dir=(1, 0, 0), z_dir=(0, -1, 0))) as fillet_6_2_piece_1:
        with BuildLine():
            CenterArc((4, -1), 1, 0, 90)
            Line((5, -1), (5, 0))
            Line((5, 0), (4, 0))
        make_face()
    revolve(axis=Axis((-14, 29.891526686, 13), (0, 0, 1)), revolution_arc=25, mode=Mode.SUBTRACT)
    with BuildSketch(Plane(origin=(-14, 29.891526686, -13), x_dir=(0.906307787036653, 0.4226182617406928, 0), z_dir=(-0.4226182617406928, 0.906307787036653, 0))) as fillet_6_2_piece_2:
        with BuildLine():
            CenterArc((4, -1), 1, 0, 90)
            Line((5, -1), (5, 0))
            Line((5, 0), (4, 0))
        make_face()
    revolve(axis=Axis((-14, 29.891526686, -13), (0, 0, -1)), revolution_arc=25, mode=Mode.SUBTRACT)
    with BuildSketch(Plane(origin=(-9, 30.999999999, -13), x_dir=(-0.422618261740692, 0.9063077870366535, 0), z_dir=(0, 0, 1))) as fillet_6_2_piece_3:
        with BuildLine():
            CenterArc((FILLET_6_R * 0.221694662643, FILLET_6_R), FILLET_6_R, 245, 25)
            Line((-FILLET_6_R * 0.200923599098, FILLET_6_R * 0.0936922129633), (0, 0))
            Line((0, 0), (FILLET_6_R * 0.221694662643, 0))
        make_face()
    extrude(amount=26, mode=Mode.SUBTRACT)

    # 草图20 → 凸台-拉伸7 (add, symmetric)
    with BuildSketch(Plane.XY.offset(8)):
        Polygon((-9, 21), (6, 6), (-9, 6), align=None)
    extrude_7 = extrude(amount=EXTRUDE_7_DEPTH, both=True)

    # 镜向1: 凸台-拉伸7 across plane
    add(extrude_7.mirror(Plane(origin=(0, 0, 0), x_dir=(1, 0, 0), z_dir=(0, 0, -1))))

    # 圆角7
    fillet_7_edges = [part.edges().sort_by_distance(p)[0] for p in [
        (-9, 21, 8),
        (6, 6, 8),
        (-9, 21, -8),
        (6, 6, -8),
    ]]
    fillet(fillet_7_edges, radius=FILLET_7_R)

    # 圆角8
    fillet_8_edges = [part.edges().sort_by_distance(p)[0] for p in [
        (-9, 6, 0),
    ]]
    fillet(fillet_8_edges, radius=FILLET_8_R)


solid = part.part
